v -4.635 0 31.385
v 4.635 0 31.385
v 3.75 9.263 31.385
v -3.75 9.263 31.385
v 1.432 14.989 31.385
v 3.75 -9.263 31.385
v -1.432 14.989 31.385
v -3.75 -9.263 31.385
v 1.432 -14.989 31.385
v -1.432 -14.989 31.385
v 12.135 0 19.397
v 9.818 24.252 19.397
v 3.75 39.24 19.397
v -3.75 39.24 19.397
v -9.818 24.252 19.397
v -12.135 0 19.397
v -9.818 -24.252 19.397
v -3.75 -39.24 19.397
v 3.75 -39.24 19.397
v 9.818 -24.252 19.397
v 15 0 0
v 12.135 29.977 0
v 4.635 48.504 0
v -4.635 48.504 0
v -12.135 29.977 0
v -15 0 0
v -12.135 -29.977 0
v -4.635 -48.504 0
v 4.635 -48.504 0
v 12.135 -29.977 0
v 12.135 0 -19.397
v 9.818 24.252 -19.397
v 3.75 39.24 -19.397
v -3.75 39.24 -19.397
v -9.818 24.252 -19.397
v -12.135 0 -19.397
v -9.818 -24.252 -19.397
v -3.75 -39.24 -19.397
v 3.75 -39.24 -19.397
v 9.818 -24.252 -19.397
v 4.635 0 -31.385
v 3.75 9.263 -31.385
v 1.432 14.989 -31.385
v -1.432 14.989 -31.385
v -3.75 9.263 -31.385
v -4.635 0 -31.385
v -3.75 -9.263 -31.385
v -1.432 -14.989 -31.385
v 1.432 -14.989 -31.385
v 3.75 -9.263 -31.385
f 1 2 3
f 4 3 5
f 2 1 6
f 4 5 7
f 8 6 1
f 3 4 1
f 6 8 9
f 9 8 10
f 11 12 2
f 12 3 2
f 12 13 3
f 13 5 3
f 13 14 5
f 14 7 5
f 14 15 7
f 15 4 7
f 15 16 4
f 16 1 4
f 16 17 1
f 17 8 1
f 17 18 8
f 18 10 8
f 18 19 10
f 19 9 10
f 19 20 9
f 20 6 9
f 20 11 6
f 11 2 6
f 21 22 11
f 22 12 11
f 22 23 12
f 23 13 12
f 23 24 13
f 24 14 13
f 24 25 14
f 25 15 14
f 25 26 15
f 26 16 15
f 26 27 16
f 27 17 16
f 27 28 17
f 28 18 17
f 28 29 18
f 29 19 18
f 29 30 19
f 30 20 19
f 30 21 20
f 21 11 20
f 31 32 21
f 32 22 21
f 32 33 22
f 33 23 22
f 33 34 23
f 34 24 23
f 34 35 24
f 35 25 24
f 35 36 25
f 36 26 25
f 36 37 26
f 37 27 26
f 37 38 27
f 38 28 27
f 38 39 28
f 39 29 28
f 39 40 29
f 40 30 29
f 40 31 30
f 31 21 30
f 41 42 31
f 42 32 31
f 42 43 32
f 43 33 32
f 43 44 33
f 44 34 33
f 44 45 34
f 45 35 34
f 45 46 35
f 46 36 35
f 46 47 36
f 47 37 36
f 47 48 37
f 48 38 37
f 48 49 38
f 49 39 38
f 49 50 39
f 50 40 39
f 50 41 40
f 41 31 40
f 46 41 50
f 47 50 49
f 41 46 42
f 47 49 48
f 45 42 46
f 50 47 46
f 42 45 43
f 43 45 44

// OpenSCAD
// Generated by SolidPython 1.0.1 on 2020-07-29 00:46:46


scale(v = [5, 17, 11]) {
	sphere(r = 3);
}
/***********************************************
*********      SolidPython code:      **********
************************************************
 
# import packages: SolidPython
from solid import *
from solid.utils import *
from itertools import chain, combinations, permutations


class Resize:

    def __init__(self, scad_file):
        self.scad_file = scad_file
        #self.scad_file = import_scad(scad_file)
        # cone/cylinder param:
        self.r1 = 0
        self.r2 = 0
        self.h = 0
        # rectangular prism param:
        self.w = 0
        self.l = 0
        # ellipse param:
        self.r = 0

    # import OpenScad code (file name corresponds to shape)


    # classify shape + parameters
    def assign(self, param1, param2, param3):
        if self.scad_file == 'cone.scad':
            self.r1 = param1
            self.r2 = param2
            self.h = param3
        elif self.scad_file == 'cylinder.scad':
            self.r1 = param1
            self.r2 = param2
            self.h = param3
        elif self.scad_file == 'rectangularPrism.scad':
            self.h = param1
            self.l = param2
            self.w = param3
        else:
            self.r = param1
            self.h = param2

    # resize parameters
    def iterate(self):
        x = range(3, 20, 2)
        i = 1
        if self.scad_file == 'cone.scad':
            tempList = list(permutations(x, 2))
            for temp in tempList:
                param1 = temp[0]
                param2 = temp[1]
                filepath = 'produced_scad_files/' + 'cone' + str(param1) + '_' + str(param2) + '_' + '.scad'
                scad_render_to_file(cylinder(h=param1, r1=param2, r2=0), filepath)

        elif self.scad_file == 'cylinder.scad':
            tempList = list(permutations(x, 3))
            for temp in tempList:
                param1 = temp[0]
                param2 = temp[1]
                filepath = 'produced_scad_files/' + 'cylinder' + str(param1) + '_' + str(param2) + '_' + '.scad'
                scad_render_to_file(cylinder(h=param1, r1=param2, r2=param2), filepath)

        elif self.scad_file == 'rectangularPrism.scad':
            tempList = list(permutations(x, 3))
            for temp in tempList:
                param1 = temp[0]
                param2 = temp[1]
                param3 = temp[2]
                filepath = 'produced_scad_files/' + 'rectangularPrism' + str(param1) + '_' + str(param2) + '_' + str(
                    param3) + '.scad'
                scad_render_to_file(cube(size=(param1, param2, param3)), filepath)

        elif self.scad_file == 'ellipse.scad':
            tempList = list(permutations(x, 4))
            for temp in tempList:
                param1 = temp[0]
                param2 = temp[1]
                param3 = temp[2]
                param4 = temp[3]
                filepath = 'produced_scad_files/' + 'ellipse' + str(param1) + '_' + str(param2) + '_' + str(param3) + '_' + str(param4) + '.scad'
                scad_render_to_file(scale([param1, param2, param3])(sphere(r=param4)), filepath)

    def render_to_scadfile(self):
        scad_render_to_file(scad, 'example.scad') 
 
************************************************/
